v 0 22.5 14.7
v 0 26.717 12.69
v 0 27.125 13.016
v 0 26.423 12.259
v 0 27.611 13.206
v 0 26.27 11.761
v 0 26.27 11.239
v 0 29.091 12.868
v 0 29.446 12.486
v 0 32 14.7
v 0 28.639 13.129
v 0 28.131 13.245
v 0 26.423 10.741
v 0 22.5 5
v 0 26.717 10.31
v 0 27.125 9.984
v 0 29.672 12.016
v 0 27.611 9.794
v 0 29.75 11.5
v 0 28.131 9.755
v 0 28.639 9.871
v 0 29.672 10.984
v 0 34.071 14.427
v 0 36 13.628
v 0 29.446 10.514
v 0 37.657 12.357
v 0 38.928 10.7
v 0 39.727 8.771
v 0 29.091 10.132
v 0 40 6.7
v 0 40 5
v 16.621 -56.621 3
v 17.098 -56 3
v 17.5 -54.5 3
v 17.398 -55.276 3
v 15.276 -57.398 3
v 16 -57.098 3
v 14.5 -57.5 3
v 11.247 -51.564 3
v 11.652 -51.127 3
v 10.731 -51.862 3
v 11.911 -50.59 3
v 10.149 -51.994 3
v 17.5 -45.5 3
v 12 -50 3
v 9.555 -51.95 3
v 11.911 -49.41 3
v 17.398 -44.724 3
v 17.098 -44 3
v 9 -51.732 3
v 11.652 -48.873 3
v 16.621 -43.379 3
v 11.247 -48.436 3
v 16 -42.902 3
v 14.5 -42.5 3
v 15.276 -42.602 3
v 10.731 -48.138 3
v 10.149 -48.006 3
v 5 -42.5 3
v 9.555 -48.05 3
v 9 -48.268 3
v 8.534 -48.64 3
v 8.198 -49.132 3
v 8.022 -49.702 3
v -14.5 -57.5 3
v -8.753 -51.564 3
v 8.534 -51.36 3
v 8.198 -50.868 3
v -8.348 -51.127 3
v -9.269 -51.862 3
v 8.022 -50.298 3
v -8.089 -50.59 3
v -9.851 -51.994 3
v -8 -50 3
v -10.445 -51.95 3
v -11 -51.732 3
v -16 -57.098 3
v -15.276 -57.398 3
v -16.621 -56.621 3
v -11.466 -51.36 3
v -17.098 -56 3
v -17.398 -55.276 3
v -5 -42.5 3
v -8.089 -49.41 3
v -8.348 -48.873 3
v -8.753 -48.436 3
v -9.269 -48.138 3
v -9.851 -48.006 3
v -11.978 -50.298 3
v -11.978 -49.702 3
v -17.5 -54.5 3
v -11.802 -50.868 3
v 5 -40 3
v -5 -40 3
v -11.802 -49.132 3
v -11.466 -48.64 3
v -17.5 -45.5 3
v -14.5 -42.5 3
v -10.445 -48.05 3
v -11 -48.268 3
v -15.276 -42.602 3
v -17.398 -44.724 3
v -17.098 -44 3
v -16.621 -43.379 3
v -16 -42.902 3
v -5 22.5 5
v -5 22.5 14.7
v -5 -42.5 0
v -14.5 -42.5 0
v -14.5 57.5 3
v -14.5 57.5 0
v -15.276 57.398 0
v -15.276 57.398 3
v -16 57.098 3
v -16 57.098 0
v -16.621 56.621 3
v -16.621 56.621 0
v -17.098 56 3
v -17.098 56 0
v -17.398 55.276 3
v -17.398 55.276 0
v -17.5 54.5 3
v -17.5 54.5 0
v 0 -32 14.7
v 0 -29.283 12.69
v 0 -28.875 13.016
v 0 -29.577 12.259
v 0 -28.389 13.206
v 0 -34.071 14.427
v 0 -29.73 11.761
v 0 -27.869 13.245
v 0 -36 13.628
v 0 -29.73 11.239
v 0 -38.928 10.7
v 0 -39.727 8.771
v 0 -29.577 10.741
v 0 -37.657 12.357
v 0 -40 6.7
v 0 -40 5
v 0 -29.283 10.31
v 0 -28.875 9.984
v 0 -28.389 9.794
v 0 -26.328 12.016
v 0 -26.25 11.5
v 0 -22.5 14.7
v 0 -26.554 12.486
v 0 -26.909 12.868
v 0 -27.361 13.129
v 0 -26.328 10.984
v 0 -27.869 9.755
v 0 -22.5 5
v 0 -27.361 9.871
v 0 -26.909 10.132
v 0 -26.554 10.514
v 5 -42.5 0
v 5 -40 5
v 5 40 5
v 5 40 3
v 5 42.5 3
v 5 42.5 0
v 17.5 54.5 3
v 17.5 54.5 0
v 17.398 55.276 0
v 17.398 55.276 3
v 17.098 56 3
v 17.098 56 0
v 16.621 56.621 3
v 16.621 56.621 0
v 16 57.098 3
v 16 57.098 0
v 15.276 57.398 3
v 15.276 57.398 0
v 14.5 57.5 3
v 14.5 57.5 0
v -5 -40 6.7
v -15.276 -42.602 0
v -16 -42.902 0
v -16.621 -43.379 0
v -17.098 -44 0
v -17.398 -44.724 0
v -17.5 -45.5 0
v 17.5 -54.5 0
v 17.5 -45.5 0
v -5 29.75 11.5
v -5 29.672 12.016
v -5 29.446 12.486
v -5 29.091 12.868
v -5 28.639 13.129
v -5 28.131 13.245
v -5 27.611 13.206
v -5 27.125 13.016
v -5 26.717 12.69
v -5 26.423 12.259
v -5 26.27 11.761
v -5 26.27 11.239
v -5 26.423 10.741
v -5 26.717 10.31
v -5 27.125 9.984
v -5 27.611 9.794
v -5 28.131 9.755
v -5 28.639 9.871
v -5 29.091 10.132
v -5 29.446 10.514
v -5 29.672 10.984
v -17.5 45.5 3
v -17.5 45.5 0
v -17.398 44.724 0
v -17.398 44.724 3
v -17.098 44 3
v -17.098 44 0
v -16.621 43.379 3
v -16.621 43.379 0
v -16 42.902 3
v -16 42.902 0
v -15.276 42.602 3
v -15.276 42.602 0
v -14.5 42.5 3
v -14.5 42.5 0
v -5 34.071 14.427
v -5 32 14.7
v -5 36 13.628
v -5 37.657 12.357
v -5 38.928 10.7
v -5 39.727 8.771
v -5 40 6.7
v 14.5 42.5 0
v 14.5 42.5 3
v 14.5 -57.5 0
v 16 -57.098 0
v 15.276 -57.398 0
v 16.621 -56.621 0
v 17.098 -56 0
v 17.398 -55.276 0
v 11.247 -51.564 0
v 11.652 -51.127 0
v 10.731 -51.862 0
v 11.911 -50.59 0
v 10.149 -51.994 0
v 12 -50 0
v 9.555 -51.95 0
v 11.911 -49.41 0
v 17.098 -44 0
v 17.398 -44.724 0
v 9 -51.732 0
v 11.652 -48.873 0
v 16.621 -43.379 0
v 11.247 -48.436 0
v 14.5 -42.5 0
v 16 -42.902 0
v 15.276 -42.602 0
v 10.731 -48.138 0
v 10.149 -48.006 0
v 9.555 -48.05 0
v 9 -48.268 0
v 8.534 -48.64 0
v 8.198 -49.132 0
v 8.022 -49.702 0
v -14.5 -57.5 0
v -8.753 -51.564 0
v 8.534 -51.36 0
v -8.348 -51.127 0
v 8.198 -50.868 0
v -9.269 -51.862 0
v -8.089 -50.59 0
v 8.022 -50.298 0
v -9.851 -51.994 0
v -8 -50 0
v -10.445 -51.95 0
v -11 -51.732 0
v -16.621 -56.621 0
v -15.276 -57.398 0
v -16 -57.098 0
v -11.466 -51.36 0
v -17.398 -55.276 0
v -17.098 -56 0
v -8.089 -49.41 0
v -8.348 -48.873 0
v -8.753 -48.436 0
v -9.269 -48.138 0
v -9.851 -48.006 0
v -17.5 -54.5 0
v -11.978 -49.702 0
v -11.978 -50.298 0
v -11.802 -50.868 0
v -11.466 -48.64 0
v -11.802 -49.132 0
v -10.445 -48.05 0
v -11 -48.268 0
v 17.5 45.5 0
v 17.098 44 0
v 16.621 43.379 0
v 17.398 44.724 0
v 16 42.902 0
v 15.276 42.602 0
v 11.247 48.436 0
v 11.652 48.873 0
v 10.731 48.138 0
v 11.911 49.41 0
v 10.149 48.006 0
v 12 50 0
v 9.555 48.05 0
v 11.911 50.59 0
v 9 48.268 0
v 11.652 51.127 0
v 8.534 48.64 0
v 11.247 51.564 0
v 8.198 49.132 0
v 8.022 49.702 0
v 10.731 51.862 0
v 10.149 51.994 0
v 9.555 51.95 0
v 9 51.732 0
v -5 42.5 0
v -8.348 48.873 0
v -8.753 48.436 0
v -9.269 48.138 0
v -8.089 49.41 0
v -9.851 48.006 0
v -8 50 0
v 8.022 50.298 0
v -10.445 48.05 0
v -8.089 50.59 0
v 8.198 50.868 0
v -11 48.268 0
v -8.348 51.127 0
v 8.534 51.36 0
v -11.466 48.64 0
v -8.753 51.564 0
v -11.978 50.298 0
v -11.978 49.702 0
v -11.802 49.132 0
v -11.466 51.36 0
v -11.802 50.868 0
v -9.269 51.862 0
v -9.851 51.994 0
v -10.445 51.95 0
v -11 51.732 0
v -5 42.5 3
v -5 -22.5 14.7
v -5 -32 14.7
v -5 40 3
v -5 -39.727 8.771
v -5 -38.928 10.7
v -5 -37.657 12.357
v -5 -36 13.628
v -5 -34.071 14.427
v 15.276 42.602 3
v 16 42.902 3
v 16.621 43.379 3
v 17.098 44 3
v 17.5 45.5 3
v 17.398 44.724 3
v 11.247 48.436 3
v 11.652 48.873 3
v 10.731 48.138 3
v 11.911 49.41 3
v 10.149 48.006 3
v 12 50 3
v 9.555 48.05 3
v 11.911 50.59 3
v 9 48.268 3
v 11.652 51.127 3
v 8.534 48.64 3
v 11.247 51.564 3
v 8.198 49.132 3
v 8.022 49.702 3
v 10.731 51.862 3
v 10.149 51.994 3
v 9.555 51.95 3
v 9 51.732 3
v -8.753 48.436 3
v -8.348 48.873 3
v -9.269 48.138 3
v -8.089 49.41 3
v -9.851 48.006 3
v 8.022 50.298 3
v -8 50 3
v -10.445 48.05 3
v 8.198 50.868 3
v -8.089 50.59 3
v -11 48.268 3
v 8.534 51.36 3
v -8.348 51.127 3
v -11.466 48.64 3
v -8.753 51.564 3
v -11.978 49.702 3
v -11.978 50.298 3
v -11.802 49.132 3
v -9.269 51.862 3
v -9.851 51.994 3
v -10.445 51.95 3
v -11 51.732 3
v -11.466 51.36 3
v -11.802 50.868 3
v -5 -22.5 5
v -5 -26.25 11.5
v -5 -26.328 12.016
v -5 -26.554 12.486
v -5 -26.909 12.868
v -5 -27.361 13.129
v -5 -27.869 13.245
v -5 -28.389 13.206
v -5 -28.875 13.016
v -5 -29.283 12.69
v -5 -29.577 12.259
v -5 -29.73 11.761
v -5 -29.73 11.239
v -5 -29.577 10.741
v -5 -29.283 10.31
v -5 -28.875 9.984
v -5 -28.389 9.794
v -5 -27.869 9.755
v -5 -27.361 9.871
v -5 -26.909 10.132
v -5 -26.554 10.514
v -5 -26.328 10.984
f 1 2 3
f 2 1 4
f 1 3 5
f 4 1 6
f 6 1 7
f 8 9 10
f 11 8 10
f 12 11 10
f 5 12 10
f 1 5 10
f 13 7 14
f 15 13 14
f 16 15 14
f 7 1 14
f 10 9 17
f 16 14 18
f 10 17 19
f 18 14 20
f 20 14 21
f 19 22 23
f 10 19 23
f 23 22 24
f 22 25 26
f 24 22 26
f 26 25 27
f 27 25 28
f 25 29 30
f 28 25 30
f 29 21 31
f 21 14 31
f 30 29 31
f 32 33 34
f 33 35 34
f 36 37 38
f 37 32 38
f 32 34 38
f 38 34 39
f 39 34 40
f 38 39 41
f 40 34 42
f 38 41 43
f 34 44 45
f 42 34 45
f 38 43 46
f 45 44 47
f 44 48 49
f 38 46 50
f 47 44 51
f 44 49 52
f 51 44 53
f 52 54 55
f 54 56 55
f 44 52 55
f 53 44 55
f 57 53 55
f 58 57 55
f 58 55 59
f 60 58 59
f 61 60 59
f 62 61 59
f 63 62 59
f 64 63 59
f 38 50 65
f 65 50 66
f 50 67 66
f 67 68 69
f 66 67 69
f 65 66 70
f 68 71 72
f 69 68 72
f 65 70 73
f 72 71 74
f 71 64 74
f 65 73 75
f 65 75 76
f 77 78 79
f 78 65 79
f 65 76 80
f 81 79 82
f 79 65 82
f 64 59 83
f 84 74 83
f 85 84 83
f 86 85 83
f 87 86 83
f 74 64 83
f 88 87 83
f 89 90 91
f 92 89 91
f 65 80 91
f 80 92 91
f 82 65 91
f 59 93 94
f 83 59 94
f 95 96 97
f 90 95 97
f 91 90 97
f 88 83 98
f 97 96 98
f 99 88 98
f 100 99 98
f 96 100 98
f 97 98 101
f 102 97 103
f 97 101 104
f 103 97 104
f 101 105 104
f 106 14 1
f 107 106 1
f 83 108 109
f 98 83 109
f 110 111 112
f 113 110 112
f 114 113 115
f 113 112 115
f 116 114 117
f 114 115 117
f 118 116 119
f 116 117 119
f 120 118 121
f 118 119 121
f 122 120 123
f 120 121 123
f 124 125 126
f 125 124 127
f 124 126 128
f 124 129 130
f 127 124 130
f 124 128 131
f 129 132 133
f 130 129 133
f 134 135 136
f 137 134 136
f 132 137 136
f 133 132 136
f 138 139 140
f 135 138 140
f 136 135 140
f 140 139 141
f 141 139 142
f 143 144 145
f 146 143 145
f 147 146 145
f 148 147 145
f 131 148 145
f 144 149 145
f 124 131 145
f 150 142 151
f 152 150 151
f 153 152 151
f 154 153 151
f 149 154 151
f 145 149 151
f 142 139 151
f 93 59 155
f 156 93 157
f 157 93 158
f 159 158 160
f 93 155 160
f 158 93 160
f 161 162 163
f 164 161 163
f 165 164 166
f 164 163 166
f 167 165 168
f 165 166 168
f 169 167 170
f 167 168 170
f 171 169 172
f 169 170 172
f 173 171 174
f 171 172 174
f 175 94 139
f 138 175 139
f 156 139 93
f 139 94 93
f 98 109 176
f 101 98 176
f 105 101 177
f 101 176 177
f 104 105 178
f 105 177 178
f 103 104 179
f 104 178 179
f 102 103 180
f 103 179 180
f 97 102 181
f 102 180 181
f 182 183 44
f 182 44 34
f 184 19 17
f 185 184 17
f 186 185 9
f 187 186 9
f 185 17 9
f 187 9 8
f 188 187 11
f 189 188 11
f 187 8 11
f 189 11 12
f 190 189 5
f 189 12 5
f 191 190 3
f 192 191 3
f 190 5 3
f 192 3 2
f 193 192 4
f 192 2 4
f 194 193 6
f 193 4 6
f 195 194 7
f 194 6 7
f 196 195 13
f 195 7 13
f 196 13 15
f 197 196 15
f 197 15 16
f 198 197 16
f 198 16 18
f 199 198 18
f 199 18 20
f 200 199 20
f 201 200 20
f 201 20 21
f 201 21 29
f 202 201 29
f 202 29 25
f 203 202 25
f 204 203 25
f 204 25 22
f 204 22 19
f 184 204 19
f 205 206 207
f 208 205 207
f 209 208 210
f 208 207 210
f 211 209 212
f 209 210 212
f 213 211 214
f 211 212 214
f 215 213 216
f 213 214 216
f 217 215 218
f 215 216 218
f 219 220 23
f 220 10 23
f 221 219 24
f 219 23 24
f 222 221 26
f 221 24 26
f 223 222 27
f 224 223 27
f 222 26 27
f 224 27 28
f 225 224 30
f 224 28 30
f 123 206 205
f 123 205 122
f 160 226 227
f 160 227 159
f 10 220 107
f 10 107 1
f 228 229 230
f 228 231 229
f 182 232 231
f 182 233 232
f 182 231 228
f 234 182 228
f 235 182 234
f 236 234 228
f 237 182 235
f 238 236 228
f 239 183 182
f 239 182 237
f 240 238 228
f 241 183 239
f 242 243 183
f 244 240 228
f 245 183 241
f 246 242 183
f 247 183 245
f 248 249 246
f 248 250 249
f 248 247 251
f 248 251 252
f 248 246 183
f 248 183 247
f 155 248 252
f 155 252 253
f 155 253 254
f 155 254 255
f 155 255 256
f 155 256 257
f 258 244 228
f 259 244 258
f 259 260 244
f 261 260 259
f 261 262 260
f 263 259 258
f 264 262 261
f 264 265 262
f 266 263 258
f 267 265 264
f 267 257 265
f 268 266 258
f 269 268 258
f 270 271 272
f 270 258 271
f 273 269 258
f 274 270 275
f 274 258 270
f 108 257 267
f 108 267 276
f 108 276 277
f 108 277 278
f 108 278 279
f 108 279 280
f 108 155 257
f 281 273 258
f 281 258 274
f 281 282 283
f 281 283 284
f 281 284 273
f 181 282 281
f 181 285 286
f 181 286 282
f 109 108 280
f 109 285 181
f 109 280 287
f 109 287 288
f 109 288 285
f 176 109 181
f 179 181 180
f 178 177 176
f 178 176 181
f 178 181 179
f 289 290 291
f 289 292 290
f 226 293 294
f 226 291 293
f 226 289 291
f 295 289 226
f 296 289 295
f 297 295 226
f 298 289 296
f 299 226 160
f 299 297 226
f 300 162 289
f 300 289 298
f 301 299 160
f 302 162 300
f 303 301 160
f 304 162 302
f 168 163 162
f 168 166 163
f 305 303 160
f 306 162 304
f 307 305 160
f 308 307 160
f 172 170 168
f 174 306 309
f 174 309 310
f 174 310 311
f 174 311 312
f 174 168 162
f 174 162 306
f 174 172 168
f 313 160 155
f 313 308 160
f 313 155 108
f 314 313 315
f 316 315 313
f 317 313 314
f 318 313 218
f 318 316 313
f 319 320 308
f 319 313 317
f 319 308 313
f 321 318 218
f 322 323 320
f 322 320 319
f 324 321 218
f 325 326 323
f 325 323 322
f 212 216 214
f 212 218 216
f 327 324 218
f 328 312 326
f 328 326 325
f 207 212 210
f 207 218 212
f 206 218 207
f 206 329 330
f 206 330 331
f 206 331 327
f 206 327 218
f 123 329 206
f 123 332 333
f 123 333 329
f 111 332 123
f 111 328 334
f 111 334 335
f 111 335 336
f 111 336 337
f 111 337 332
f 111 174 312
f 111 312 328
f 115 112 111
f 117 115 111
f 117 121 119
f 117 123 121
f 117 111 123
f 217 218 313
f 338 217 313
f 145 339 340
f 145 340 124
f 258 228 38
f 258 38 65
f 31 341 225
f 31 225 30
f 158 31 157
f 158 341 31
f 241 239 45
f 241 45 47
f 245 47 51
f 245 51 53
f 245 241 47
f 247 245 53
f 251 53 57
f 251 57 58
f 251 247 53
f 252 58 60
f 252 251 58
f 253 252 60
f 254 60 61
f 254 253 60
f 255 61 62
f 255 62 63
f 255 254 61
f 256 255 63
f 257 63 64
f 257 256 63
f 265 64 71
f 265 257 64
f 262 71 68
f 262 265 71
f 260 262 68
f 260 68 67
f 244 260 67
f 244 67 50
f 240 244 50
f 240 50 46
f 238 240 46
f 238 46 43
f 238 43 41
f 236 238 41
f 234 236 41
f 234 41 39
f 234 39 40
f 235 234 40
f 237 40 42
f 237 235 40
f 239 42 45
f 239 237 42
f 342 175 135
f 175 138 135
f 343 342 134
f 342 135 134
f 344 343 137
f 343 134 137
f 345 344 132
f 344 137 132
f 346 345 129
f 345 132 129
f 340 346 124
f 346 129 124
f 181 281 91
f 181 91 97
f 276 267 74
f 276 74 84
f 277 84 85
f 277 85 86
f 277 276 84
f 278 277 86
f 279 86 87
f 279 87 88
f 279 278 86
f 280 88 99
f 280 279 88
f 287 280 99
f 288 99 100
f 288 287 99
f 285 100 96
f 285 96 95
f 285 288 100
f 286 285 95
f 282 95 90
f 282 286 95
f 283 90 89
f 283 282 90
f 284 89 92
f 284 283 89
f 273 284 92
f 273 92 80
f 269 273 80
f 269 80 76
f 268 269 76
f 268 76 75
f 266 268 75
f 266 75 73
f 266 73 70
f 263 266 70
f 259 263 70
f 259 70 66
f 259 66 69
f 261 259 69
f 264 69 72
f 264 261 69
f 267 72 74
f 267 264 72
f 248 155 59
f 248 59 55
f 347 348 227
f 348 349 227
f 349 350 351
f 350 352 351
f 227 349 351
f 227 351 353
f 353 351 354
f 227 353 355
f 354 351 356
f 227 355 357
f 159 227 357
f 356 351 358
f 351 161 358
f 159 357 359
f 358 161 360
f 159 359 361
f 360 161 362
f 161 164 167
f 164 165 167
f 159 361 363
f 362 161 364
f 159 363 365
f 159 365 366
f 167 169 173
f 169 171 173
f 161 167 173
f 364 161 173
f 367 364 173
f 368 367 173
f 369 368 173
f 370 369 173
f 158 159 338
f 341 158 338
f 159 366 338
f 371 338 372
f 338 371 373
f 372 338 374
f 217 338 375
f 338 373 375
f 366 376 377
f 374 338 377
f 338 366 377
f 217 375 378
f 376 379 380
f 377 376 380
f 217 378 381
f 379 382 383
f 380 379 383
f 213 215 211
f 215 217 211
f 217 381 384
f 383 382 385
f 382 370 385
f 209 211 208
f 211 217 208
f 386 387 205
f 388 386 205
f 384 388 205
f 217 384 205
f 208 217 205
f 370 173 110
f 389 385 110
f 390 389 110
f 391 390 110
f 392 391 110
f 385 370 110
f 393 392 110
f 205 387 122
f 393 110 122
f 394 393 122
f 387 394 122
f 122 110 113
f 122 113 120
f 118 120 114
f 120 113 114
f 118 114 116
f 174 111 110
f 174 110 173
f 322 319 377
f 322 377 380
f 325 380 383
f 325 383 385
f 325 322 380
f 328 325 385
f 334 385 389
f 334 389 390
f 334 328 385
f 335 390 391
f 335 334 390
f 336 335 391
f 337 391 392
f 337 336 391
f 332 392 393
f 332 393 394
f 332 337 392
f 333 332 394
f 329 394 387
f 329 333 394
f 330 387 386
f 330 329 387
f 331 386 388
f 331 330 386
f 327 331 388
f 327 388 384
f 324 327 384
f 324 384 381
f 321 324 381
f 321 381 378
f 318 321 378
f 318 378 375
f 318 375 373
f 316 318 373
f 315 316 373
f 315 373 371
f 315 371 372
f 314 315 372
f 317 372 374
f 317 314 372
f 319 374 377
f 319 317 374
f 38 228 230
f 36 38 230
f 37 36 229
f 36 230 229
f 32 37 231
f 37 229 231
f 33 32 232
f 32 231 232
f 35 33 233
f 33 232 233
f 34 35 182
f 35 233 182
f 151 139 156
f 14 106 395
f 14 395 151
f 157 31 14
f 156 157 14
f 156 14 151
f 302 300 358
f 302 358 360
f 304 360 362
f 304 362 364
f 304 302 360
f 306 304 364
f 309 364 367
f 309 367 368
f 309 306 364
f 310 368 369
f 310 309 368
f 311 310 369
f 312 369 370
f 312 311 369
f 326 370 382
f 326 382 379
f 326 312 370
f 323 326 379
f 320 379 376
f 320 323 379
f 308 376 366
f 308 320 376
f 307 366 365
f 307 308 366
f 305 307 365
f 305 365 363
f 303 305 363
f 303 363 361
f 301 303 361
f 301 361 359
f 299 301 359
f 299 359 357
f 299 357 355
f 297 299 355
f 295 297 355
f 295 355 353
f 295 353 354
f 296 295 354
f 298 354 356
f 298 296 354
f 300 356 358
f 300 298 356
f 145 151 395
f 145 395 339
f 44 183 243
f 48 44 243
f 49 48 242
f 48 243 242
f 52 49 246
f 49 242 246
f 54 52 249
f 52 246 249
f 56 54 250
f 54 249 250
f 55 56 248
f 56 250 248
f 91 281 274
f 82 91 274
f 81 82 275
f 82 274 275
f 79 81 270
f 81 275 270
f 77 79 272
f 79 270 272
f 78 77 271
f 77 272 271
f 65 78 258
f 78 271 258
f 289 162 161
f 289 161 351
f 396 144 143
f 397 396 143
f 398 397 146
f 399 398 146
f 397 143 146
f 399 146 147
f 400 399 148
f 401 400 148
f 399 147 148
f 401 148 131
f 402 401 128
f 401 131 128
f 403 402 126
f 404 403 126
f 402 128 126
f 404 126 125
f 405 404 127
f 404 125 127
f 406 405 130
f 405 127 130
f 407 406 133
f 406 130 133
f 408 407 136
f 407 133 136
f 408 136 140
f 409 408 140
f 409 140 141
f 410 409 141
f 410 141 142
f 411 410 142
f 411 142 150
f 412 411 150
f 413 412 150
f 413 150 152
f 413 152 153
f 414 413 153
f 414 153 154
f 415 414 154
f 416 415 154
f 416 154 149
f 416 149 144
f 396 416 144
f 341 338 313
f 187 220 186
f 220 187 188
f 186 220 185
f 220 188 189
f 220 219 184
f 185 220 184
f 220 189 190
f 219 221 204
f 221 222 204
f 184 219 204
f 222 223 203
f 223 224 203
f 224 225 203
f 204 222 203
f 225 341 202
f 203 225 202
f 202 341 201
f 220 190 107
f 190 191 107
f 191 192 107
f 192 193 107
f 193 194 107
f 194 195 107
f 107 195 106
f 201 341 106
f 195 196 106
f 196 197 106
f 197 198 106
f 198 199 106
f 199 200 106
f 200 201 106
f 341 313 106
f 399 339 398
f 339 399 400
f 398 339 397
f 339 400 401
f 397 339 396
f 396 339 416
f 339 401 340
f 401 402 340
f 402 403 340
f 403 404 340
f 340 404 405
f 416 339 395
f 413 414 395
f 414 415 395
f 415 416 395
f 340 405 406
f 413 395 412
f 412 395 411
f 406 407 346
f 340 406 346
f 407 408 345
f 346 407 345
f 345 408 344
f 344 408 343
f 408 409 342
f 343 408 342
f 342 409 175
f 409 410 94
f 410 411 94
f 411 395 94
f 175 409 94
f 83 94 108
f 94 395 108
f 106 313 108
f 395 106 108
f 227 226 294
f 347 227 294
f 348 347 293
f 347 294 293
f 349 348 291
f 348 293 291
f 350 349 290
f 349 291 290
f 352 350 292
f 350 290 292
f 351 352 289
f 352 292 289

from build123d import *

# Parameters (mm, degrees)
SKETCH_R     = 2
PAD_DEPTH    = 3
SKETCH001_W  = 5
SKETCH001_H  = 80
PAD001_DEPTH = 11.7
SKETCH002_R  = 1.75
SKETCH002_W  = 45
SKETCH002_H  = 10
POCKET_DEPTH = 15
SKETCH003_W  = 5
SKETCH003_H  = 80
PAD002_DEPTH = 2
FILLET_R     = 8


with BuildPart() as part:
    # Sketch → Pad (new body)
    with BuildSketch(Plane.XY):
        with BuildLine():
            Line((-14.5, 57.5), (14.5, 57.5))
            ThreePointArc((17.5, 54.5), (16.62132, 56.62132), (14.5, 57.5))
            Line((17.5, 54.5), (17.5, 45.5))
            ThreePointArc((14.5, 42.5), (16.62132, 43.37868), (17.5, 45.5))
            Line((14.5, 42.5), (5, 42.5))
            Line((5, 42.5), (5, -42.5))
            Line((5, -42.5), (14.5, -42.5))
            ThreePointArc((17.5, -45.5), (16.62132, -43.37868), (14.5, -42.5))
            Line((17.5, -45.5), (17.5, -54.5))
            ThreePointArc((14.5, -57.5), (16.62132, -56.62132), (17.5, -54.5))
            Line((14.5, -57.5), (-14.5, -57.5))
            ThreePointArc((-17.5, -54.5), (-16.62132, -56.62132), (-14.5, -57.5))
            Line((-17.5, -54.5), (-17.5, -45.5))
            ThreePointArc((-14.5, -42.5), (-16.62132, -43.37868), (-17.5, -45.5))
            Line((-5, -42.5), (-14.5, -42.5))
            Line((-5, 42.5), (-5, -42.5))
            Line((-14.5, 42.5), (-5, 42.5))
            ThreePointArc((-17.5, 45.5), (-16.62132, 43.37868), (-14.5, 42.5))
            Line((-17.5, 45.5), (-17.5, 54.5))
            ThreePointArc((-14.5, 57.5), (-16.62132, 56.62132), (-17.5, 54.5))
        make_face()
        with Locations((-10, 50)):
            Circle(SKETCH_R, mode=Mode.SUBTRACT)
        with Locations((10, 50)):
            Circle(SKETCH_R, mode=Mode.SUBTRACT)
        with Locations((-10, -50)):
            Circle(SKETCH_R, mode=Mode.SUBTRACT)
        with Locations((10, -50)):
            Circle(SKETCH_R, mode=Mode.SUBTRACT)
    extrude(amount=PAD_DEPTH)

    # Sketch001 → Pad001 (join)
    with BuildSketch(Plane.XY.offset(3)):
        with Locations((-2.5, 0)):
            Rectangle(SKETCH001_W, SKETCH001_H)
    extrude(amount=PAD001_DEPTH)

    # Sketch002 → Pocket (cut)
    with BuildSketch(Plane.YZ.offset(5)):
        with Locations((-28, 11.5)):
            Circle(SKETCH002_R)
        with Locations((28, 11.5)):
            Circle(SKETCH002_R)
        with Locations((0, 10)):
            Rectangle(SKETCH002_W, SKETCH002_H)
    extrude(amount=-POCKET_DEPTH, mode=Mode.SUBTRACT)

    # Sketch003 → Pad002 (join)
    with BuildSketch(Plane.XY.offset(3)):
        with Locations((2.5, 0)):
            Rectangle(SKETCH003_W, SKETCH003_H)
    extrude(amount=PAD002_DEPTH)

    # Fillet
    fillet_edges = [part.edges().sort_by_distance(p)[0] for p in [
        (-2.5, -40, 14.7),
        (-2.5, 40, 14.7),
    ]]
    fillet(fillet_edges, radius=FILLET_R)


solid = part.part
